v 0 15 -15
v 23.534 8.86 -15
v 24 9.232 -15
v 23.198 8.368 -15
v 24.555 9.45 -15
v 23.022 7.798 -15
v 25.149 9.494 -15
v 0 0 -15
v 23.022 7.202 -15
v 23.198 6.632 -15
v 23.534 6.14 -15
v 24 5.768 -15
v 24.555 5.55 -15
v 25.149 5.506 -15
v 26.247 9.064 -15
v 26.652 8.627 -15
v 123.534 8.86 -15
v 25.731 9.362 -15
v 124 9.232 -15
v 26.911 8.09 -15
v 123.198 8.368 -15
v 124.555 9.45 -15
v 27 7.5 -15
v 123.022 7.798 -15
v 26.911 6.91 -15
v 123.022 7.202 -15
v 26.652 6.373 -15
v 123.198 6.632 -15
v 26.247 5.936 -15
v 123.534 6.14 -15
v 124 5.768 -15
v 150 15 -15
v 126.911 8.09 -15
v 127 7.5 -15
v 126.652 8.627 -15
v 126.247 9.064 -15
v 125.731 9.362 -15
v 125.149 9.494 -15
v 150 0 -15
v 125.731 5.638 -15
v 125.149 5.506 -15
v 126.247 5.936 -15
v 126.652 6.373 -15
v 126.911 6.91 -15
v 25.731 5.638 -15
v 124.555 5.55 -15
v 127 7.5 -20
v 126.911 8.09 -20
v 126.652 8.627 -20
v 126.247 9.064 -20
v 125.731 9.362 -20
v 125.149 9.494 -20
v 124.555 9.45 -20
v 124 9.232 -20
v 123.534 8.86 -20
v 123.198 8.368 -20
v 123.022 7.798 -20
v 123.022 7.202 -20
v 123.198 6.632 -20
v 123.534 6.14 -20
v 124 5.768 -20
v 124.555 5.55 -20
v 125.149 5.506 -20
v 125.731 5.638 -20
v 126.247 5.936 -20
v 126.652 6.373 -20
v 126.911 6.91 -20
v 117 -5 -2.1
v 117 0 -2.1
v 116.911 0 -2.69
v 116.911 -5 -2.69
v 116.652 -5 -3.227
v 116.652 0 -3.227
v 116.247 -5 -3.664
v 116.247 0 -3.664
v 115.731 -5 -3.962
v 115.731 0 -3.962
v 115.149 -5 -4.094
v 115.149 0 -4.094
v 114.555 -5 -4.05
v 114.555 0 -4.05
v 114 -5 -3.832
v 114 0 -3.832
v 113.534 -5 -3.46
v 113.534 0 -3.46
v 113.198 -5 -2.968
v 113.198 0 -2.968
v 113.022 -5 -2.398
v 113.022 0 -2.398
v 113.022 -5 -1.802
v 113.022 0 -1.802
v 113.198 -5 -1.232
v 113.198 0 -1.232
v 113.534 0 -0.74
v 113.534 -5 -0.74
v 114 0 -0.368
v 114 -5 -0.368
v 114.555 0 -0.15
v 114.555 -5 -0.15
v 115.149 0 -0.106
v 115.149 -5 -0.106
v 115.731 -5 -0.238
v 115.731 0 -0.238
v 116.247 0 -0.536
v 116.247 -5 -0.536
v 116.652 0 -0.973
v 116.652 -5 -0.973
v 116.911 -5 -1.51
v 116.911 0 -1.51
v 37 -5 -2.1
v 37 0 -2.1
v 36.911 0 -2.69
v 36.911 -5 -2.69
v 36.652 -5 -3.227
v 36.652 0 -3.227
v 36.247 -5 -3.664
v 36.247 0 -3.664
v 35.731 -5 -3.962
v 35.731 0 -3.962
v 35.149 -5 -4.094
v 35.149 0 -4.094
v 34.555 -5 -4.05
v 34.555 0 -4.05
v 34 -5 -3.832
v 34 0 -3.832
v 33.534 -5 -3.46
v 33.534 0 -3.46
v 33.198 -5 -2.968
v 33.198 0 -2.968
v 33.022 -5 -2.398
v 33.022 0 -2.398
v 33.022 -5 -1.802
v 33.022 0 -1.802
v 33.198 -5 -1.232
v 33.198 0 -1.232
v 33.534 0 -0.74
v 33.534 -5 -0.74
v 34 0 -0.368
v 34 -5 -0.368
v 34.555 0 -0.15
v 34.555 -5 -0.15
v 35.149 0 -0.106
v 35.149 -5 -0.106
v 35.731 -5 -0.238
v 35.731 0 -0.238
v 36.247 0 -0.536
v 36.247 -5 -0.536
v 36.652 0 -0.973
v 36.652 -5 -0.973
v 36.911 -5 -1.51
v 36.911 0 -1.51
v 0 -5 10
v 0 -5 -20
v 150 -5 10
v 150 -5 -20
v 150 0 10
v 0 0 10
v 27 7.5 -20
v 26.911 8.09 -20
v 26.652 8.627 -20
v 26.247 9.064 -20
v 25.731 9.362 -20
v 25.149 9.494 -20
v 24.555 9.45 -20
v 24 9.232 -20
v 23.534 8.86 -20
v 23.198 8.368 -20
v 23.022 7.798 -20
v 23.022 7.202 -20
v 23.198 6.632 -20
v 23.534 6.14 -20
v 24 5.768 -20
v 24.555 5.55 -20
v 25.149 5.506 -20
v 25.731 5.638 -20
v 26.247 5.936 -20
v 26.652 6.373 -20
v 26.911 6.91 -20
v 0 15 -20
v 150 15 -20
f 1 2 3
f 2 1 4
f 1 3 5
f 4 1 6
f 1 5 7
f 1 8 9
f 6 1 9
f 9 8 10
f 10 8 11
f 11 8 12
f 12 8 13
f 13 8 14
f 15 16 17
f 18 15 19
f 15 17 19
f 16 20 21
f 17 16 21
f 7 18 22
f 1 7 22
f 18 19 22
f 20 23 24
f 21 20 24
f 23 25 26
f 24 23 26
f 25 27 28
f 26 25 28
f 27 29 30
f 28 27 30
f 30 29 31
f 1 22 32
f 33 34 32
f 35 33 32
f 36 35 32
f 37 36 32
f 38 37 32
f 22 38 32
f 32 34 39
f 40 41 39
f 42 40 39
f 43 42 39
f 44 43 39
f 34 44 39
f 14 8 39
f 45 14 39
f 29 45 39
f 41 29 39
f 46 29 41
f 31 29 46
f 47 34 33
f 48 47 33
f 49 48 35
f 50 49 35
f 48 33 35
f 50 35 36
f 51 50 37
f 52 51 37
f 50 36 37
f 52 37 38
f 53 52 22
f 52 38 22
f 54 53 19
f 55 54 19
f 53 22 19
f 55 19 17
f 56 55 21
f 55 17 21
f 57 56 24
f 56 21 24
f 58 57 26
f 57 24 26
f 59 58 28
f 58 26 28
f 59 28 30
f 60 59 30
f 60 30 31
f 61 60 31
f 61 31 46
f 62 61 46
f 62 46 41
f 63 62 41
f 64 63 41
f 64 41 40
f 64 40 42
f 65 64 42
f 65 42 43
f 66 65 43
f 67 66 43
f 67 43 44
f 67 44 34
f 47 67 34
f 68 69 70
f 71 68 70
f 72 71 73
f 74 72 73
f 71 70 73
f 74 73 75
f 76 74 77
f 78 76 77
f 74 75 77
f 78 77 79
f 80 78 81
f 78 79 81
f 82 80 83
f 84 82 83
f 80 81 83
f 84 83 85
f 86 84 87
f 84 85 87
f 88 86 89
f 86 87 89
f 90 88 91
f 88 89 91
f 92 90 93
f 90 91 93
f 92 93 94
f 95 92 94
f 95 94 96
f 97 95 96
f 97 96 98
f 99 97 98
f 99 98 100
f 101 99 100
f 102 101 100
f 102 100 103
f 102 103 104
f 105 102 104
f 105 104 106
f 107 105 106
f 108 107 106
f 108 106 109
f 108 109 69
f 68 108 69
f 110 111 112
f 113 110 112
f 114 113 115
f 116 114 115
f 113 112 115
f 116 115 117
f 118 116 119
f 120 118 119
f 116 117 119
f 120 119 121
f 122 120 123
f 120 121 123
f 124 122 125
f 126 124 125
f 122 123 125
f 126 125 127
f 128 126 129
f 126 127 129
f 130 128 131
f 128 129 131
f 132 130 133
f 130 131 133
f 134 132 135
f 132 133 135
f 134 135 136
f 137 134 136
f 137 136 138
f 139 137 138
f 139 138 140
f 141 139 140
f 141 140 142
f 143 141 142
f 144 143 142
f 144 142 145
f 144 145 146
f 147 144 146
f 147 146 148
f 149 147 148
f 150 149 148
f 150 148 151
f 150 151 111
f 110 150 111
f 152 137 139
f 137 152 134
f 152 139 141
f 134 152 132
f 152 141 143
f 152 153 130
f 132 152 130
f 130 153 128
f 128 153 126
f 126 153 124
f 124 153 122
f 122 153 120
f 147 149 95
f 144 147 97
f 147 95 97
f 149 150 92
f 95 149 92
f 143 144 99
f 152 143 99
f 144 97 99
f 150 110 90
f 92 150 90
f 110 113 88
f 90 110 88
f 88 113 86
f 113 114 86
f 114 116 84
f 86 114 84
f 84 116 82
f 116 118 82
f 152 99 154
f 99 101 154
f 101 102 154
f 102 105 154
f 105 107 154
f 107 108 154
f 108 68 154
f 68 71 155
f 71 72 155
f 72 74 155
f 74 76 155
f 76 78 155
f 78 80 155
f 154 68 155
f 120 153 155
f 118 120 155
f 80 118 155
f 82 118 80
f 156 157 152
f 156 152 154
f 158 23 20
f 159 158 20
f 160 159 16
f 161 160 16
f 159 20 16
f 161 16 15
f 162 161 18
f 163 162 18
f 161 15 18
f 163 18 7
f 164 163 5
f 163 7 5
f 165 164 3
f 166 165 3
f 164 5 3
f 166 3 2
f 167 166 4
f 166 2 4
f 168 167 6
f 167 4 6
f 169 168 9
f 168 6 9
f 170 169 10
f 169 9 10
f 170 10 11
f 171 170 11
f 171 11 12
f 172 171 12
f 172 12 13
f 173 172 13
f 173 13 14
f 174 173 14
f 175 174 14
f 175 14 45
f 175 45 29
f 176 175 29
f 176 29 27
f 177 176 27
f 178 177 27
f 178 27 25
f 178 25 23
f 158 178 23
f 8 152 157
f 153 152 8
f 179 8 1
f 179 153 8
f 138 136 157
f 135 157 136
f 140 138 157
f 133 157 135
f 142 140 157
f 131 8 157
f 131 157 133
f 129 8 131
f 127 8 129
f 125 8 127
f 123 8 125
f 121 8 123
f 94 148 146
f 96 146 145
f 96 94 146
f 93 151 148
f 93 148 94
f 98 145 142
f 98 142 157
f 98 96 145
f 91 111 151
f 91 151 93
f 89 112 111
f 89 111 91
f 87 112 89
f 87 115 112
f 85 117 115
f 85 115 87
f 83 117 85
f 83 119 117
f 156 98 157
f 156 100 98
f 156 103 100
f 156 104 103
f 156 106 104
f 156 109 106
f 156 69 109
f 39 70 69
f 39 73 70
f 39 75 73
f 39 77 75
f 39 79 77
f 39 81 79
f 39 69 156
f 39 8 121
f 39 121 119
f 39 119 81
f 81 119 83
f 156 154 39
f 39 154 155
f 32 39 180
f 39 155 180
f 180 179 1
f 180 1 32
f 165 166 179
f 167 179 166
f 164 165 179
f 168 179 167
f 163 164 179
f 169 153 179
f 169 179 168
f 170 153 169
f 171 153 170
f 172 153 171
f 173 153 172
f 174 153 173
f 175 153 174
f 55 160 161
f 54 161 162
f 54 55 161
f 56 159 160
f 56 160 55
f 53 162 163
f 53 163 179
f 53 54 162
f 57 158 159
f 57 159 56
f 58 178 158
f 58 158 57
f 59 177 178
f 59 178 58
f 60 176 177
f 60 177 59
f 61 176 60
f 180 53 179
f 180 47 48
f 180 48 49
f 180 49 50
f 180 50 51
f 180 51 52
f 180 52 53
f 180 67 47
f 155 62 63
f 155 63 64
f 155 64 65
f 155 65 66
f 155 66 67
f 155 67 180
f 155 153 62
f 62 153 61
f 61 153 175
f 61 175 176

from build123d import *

# Parameters (mm, degrees)
SKETCH1_W           = 150
SKETCH1_H           = 20
BOSS_EXTRUDE1_DEPTH = 5
SKETCH3_W           = 150
SKETCH3_H           = 5
BOSS_EXTRUDE2_DEPTH = 15
SKETCH5_R           = 2
CUT_EXTRUDE1_DEPTH  = 6
SKETCH6_R           = 2
CUT_EXTRUDE2_DEPTH  = 6
SKETCH7_W           = 150
SKETCH7_H           = 5
BOSS_EXTRUDE3_DEPTH = 10


with BuildPart() as part:
    # Sketch1 → Boss-Extrude1 (new body)
    with BuildSketch(Plane(origin=(0, 0, 0), x_dir=(1, 0, 0), z_dir=(0, 1, 0))):
        with Locations((75, 10)):
            Rectangle(SKETCH1_W, SKETCH1_H)
    extrude(amount=-BOSS_EXTRUDE1_DEPTH)

    # Sketch3 → Boss-Extrude2 (add)
    with BuildSketch(Plane(origin=(0, 0, 0), x_dir=(1, 0, 0), z_dir=(0, 1, 0))):
        with Locations((75, 17.5)):
            Rectangle(SKETCH3_W, SKETCH3_H)
    extrude(amount=BOSS_EXTRUDE2_DEPTH)

    # Sketch5 → Cut-Extrude1 (cut, through all)
    with BuildSketch(Plane.XY.offset(-15)):
        with Locations((25, 7.5)):
            Circle(SKETCH5_R)
        with Locations((125, 7.5)):
            Circle(SKETCH5_R)
    extrude(amount=-CUT_EXTRUDE1_DEPTH, mode=Mode.SUBTRACT)

    # Sketch6 → Cut-Extrude2 (cut, through all)
    with BuildSketch(Plane(origin=(0, 0, 0), x_dir=(1, 0, 0), z_dir=(0, 1, 0))):
        with Locations((35, 2.1)):
            Circle(SKETCH6_R)
        with Locations((115, 2.1)):
            Circle(SKETCH6_R)
    extrude(amount=-CUT_EXTRUDE2_DEPTH, mode=Mode.SUBTRACT)

    # Sketch7 → Boss-Extrude3 (add)
    with BuildSketch(Plane.XY):
        with Locations((75, -2.5)):
            Rectangle(SKETCH7_W, SKETCH7_H)
    extrude(amount=BOSS_EXTRUDE3_DEPTH)


solid = part.part
